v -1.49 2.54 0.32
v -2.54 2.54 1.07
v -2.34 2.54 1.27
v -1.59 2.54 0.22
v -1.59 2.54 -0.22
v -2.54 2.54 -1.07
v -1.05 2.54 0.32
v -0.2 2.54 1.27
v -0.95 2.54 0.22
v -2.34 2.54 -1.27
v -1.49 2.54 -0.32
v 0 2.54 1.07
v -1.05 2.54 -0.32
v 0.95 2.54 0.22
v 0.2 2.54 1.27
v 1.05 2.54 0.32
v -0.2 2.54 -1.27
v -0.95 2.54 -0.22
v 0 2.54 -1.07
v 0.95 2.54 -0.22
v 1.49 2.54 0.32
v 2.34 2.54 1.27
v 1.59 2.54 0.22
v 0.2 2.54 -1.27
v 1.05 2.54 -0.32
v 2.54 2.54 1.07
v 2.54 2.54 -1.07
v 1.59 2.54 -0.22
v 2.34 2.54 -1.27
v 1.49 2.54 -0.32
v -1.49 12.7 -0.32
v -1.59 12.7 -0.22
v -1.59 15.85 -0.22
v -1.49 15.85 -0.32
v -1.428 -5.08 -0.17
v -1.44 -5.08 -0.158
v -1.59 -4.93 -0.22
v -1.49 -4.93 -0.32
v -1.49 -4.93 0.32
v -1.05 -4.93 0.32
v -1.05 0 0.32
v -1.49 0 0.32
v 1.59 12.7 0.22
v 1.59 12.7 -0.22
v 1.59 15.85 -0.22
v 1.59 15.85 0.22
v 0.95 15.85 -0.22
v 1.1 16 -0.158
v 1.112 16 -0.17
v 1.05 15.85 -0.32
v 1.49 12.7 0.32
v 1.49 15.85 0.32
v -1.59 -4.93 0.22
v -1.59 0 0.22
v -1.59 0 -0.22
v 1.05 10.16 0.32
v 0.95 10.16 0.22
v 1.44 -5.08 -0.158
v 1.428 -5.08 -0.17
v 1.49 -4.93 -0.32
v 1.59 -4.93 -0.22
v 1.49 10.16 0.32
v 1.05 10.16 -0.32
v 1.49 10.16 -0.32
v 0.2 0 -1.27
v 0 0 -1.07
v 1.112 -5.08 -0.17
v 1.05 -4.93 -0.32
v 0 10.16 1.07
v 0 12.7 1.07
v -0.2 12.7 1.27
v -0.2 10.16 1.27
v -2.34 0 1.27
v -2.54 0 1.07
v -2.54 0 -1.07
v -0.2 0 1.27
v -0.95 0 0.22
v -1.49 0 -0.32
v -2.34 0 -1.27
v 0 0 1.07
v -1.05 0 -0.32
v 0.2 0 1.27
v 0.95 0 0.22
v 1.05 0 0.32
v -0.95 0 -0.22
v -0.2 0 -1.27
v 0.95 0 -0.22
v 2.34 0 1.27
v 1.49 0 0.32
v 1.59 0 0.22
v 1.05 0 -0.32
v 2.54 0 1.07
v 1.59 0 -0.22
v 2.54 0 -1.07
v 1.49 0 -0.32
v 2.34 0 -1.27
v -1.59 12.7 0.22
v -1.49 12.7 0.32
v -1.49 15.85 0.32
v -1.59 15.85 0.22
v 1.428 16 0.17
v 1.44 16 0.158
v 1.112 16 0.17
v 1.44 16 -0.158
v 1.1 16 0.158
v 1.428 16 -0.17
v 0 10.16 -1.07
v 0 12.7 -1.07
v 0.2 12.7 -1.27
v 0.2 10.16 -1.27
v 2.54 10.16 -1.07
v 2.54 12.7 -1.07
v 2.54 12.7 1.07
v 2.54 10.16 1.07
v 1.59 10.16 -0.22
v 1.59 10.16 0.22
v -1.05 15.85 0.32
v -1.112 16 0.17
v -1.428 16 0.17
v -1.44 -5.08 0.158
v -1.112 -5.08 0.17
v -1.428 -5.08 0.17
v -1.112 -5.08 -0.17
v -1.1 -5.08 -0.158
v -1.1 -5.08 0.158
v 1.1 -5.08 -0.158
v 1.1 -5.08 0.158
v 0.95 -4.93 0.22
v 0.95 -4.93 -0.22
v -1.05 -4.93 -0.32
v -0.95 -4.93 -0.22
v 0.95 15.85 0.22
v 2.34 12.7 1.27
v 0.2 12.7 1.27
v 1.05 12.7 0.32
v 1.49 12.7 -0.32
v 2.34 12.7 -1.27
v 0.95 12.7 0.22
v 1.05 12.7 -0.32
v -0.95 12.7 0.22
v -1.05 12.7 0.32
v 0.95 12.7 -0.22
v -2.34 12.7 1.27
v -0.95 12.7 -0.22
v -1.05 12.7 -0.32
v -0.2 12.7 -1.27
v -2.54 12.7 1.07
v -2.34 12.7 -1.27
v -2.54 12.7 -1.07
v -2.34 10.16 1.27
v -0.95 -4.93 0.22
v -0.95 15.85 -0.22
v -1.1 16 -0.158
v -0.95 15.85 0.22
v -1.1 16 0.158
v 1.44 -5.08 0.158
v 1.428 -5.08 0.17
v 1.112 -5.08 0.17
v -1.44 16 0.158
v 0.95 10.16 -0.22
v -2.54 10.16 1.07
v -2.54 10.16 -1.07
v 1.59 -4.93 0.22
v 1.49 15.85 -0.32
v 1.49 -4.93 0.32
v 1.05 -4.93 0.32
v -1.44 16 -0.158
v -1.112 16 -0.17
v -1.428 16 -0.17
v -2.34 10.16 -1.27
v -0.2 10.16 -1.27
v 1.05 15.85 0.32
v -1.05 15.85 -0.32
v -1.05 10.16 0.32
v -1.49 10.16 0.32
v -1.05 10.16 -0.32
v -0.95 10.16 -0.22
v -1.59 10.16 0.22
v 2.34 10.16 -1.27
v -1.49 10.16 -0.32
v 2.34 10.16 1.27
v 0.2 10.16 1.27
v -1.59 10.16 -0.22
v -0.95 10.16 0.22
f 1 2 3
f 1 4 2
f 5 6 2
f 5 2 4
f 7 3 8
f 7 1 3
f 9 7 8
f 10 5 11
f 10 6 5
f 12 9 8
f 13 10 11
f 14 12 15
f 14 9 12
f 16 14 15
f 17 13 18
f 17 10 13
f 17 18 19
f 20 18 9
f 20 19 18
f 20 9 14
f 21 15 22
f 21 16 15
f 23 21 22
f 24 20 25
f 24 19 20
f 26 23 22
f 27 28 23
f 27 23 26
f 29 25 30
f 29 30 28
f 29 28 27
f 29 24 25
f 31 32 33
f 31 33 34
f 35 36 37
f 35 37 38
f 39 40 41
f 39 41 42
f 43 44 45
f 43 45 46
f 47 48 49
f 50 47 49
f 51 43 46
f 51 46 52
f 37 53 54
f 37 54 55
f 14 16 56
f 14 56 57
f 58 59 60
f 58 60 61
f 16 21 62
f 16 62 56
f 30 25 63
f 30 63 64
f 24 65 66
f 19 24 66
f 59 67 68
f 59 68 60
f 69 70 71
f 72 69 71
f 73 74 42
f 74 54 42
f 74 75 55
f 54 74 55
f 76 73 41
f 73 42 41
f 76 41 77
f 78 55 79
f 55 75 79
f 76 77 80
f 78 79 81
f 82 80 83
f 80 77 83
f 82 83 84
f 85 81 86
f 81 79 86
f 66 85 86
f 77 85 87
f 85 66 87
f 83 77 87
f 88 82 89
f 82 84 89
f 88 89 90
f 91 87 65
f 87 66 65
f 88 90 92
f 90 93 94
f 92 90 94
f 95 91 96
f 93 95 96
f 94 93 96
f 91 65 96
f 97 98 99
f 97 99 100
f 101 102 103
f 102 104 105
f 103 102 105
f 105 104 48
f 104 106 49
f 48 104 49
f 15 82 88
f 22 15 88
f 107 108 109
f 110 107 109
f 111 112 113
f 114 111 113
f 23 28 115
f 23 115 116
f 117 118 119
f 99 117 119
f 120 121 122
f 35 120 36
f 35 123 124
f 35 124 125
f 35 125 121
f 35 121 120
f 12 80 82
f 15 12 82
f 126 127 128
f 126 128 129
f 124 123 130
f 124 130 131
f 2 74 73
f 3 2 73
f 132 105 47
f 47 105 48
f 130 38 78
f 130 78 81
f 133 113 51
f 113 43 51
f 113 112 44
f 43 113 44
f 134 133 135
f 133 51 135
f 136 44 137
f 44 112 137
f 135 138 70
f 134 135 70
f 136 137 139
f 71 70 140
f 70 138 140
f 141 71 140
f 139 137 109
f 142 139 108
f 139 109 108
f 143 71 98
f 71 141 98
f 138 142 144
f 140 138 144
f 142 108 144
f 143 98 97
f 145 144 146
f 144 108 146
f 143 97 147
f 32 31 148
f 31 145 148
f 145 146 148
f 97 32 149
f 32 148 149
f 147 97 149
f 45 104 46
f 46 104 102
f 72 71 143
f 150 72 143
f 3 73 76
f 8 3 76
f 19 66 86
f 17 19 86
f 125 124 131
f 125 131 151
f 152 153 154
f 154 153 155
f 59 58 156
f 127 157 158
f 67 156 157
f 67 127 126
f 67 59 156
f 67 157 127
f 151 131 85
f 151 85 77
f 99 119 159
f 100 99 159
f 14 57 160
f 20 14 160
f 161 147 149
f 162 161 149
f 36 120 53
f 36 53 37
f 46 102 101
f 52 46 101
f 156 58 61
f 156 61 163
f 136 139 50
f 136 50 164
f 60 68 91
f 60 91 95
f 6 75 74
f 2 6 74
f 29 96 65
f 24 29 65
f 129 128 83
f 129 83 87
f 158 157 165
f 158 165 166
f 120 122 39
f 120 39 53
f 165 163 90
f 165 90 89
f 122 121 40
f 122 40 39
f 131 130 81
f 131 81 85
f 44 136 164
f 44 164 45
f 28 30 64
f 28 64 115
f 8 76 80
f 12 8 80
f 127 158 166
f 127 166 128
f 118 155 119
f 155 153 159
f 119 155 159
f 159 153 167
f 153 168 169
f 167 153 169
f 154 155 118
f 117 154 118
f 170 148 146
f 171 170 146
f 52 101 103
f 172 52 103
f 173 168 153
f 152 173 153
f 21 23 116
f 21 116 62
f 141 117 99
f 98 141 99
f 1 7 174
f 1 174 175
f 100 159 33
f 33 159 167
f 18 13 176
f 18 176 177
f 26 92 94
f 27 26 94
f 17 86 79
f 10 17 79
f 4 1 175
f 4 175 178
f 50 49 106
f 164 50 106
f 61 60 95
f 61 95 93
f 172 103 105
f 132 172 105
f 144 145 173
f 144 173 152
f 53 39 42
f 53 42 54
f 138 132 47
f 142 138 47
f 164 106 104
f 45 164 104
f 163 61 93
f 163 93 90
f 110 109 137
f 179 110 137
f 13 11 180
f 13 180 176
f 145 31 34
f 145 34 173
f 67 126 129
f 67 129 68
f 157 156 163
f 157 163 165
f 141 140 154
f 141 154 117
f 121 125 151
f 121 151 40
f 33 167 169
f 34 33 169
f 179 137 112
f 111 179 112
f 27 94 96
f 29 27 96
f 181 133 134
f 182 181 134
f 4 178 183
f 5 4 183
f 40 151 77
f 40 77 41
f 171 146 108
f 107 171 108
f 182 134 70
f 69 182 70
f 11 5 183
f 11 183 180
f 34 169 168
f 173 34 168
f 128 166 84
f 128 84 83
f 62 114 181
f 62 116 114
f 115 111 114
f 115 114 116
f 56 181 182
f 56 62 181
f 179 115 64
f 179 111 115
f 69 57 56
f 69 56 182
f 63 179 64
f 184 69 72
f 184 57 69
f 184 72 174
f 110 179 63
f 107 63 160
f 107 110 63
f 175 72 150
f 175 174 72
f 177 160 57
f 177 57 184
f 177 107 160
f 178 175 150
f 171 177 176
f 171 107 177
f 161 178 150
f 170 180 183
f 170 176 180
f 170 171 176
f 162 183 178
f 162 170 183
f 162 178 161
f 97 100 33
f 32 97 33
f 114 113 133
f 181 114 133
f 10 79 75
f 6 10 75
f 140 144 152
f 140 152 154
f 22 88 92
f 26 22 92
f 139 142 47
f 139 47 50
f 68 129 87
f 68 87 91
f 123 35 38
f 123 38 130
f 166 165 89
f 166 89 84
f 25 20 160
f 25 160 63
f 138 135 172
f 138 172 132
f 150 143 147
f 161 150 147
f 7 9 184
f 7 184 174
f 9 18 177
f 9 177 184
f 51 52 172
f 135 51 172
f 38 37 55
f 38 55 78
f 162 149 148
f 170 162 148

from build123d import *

# Parameters (mm, degrees)
EXTRUDE_1_DEPTH   = 5.08
EXTRUDE_1_2_DEPTH = 5.08
EXTRUDE_2_DEPTH   = 16
EXTRUDE_3_DEPTH   = 2.54
EXTRUDE_START     = 12.7
EXTRUDE_4_DEPTH   = 2.54
CHAMFER_1_SIZE    = 0.15


with BuildPart() as part:
    # Эскиз1 → Бобышка-Вытянуть1 (new body)
    with BuildSketch(Plane(origin=(0, 0, 0), x_dir=(1, 0, 0), z_dir=(0, 1, 0))):
        Polygon((-1.49, 0.32), (-1.59, 0.22), (-1.59, -0.22), (-1.49, -0.32), (-1.05, -0.32), (-0.95, -0.22), (-0.95, 0.22), (-1.05, 0.32), align=None)
    extrude(amount=-EXTRUDE_1_DEPTH)



with BuildPart() as body_2:
    # Эскиз1 → Extrude 1 2 (new body)
    with BuildSketch(Plane(origin=(0, 0, 0), x_dir=(1, 0, 0), z_dir=(0, 1, 0))):
        Polygon((1.05, 0.32), (0.95, 0.22), (0.95, -0.22), (1.05, -0.32), (1.49, -0.32), (1.59, -0.22), (1.59, 0.22), (1.49, 0.32), align=None)
    extrude(amount=-EXTRUDE_1_2_DEPTH)


with BuildPart() as part_1:
    add(part.part)

    add(body_2.part)  # Бобышка-Вытянуть2 merges body 2
    # Эскиз1<3> → Бобышка-Вытянуть2 (add)
    with BuildSketch(Plane(origin=(0, 0, 0), x_dir=(1, 0, 0), z_dir=(0, 1, 0))):
        Polygon((-1.49, 0.32), (-1.59, 0.22), (-1.59, -0.22), (-1.49, -0.32), (-1.05, -0.32), (-0.95, -0.22), (-0.95, 0.22), (-1.05, 0.32), align=None)
        Polygon((1.05, 0.32), (0.95, 0.22), (0.95, -0.22), (1.05, -0.32), (1.49, -0.32), (1.59, -0.22), (1.59, 0.22), (1.49, 0.32), align=None)
    extrude(amount=EXTRUDE_2_DEPTH)

    # Эскиз1<4> → Бобышка-Вытянуть3 (add)
    with BuildSketch(Plane(origin=(0, 0, 0), x_dir=(1, 0, 0), z_dir=(0, 1, 0))):
        Polygon((-0.2, 1.27), (-2.34, 1.27), (-2.54, 1.07), (-2.54, -1.07), (-2.34, -1.27), (-0.2, -1.27), (0, -1.07), (0.2, -1.27), (2.34, -1.27), (2.54, -1.07), (2.54, 1.07), (2.34, 1.27), (0.2, 1.27), (0, 1.07), align=None)
        Polygon((-1.59, -0.22), (-1.59, 0.22), (-1.49, 0.32), (-1.05, 0.32), (-0.95, 0.22), (-0.95, -0.22), (-1.05, -0.32), (-1.49, -0.32), align=None, mode=Mode.SUBTRACT)
        Polygon((0.95, 0.22), (1.05, 0.32), (1.49, 0.32), (1.59, 0.22), (1.59, -0.22), (1.49, -0.32), (1.05, -0.32), (0.95, -0.22), align=None, mode=Mode.SUBTRACT)
    extrude(amount=EXTRUDE_3_DEPTH)

    # Эскиз1<5> → Бобышка-Вытянуть4 (add)
    with BuildSketch(Plane(origin=(0, 0, 0), x_dir=(1, 0, 0), z_dir=(0, 1, 0)).offset(EXTRUDE_START)):
        Polygon((-0.2, 1.27), (-2.34, 1.27), (-2.54, 1.07), (-2.54, -1.07), (-2.34, -1.27), (-0.2, -1.27), (0, -1.07), (0.2, -1.27), (2.34, -1.27), (2.54, -1.07), (2.54, 1.07), (2.34, 1.27), (0.2, 1.27), (0, 1.07), align=None)
        Polygon((-1.59, -0.22), (-1.59, 0.22), (-1.49, 0.32), (-1.05, 0.32), (-0.95, 0.22), (-0.95, -0.22), (-1.05, -0.32), (-1.49, -0.32), align=None, mode=Mode.SUBTRACT)
        Polygon((0.95, 0.22), (1.05, 0.32), (1.49, 0.32), (1.59, 0.22), (1.59, -0.22), (1.49, -0.32), (1.05, -0.32), (0.95, -0.22), align=None, mode=Mode.SUBTRACT)
    extrude(amount=-EXTRUDE_4_DEPTH)

    # Фаска1
    chamfer_1_edges = [part_1.edges().sort_by_distance(p)[0] for p in [
        (-1.54, -5.08, 0.27),
        (-1.27, -5.08, 0.32),
        (-1, -5.08, 0.27),
        (-0.95, -5.08, 0),
        (-1, -5.08, -0.27),
        (-1.27, -5.08, -0.32),
        (-1.54, -5.08, -0.27),
        (-1.59, -5.08, 0),
        (1, -5.08, 0.27),
        (1.27, -5.08, 0.32),
        (1.54, -5.08, 0.27),
        (1.59, -5.08, 0),
        (1.54, -5.08, -0.27),
        (1.27, -5.08, -0.32),
        (1, -5.08, -0.27),
        (0.95, -5.08, 0),
        (1, 16, -0.27),
        (1.27, 16, -0.32),
        (1.54, 16, -0.27),
        (1.59, 16, 0),
        (1.54, 16, 0.27),
        (1.27, 16, 0.32),
        (1, 16, 0.27),
        (0.95, 16, 0),
        (-1.54, 16, -0.27),
        (-1.27, 16, -0.32),
        (-1, 16, -0.27),
        (-0.95, 16, 0),
        (-1, 16, 0.27),
        (-1.27, 16, 0.32),
        (-1.54, 16, 0.27),
        (-1.59, 16, 0),
    ]]
    chamfer(chamfer_1_edges, length=CHAMFER_1_SIZE)


solid = part_1.part
